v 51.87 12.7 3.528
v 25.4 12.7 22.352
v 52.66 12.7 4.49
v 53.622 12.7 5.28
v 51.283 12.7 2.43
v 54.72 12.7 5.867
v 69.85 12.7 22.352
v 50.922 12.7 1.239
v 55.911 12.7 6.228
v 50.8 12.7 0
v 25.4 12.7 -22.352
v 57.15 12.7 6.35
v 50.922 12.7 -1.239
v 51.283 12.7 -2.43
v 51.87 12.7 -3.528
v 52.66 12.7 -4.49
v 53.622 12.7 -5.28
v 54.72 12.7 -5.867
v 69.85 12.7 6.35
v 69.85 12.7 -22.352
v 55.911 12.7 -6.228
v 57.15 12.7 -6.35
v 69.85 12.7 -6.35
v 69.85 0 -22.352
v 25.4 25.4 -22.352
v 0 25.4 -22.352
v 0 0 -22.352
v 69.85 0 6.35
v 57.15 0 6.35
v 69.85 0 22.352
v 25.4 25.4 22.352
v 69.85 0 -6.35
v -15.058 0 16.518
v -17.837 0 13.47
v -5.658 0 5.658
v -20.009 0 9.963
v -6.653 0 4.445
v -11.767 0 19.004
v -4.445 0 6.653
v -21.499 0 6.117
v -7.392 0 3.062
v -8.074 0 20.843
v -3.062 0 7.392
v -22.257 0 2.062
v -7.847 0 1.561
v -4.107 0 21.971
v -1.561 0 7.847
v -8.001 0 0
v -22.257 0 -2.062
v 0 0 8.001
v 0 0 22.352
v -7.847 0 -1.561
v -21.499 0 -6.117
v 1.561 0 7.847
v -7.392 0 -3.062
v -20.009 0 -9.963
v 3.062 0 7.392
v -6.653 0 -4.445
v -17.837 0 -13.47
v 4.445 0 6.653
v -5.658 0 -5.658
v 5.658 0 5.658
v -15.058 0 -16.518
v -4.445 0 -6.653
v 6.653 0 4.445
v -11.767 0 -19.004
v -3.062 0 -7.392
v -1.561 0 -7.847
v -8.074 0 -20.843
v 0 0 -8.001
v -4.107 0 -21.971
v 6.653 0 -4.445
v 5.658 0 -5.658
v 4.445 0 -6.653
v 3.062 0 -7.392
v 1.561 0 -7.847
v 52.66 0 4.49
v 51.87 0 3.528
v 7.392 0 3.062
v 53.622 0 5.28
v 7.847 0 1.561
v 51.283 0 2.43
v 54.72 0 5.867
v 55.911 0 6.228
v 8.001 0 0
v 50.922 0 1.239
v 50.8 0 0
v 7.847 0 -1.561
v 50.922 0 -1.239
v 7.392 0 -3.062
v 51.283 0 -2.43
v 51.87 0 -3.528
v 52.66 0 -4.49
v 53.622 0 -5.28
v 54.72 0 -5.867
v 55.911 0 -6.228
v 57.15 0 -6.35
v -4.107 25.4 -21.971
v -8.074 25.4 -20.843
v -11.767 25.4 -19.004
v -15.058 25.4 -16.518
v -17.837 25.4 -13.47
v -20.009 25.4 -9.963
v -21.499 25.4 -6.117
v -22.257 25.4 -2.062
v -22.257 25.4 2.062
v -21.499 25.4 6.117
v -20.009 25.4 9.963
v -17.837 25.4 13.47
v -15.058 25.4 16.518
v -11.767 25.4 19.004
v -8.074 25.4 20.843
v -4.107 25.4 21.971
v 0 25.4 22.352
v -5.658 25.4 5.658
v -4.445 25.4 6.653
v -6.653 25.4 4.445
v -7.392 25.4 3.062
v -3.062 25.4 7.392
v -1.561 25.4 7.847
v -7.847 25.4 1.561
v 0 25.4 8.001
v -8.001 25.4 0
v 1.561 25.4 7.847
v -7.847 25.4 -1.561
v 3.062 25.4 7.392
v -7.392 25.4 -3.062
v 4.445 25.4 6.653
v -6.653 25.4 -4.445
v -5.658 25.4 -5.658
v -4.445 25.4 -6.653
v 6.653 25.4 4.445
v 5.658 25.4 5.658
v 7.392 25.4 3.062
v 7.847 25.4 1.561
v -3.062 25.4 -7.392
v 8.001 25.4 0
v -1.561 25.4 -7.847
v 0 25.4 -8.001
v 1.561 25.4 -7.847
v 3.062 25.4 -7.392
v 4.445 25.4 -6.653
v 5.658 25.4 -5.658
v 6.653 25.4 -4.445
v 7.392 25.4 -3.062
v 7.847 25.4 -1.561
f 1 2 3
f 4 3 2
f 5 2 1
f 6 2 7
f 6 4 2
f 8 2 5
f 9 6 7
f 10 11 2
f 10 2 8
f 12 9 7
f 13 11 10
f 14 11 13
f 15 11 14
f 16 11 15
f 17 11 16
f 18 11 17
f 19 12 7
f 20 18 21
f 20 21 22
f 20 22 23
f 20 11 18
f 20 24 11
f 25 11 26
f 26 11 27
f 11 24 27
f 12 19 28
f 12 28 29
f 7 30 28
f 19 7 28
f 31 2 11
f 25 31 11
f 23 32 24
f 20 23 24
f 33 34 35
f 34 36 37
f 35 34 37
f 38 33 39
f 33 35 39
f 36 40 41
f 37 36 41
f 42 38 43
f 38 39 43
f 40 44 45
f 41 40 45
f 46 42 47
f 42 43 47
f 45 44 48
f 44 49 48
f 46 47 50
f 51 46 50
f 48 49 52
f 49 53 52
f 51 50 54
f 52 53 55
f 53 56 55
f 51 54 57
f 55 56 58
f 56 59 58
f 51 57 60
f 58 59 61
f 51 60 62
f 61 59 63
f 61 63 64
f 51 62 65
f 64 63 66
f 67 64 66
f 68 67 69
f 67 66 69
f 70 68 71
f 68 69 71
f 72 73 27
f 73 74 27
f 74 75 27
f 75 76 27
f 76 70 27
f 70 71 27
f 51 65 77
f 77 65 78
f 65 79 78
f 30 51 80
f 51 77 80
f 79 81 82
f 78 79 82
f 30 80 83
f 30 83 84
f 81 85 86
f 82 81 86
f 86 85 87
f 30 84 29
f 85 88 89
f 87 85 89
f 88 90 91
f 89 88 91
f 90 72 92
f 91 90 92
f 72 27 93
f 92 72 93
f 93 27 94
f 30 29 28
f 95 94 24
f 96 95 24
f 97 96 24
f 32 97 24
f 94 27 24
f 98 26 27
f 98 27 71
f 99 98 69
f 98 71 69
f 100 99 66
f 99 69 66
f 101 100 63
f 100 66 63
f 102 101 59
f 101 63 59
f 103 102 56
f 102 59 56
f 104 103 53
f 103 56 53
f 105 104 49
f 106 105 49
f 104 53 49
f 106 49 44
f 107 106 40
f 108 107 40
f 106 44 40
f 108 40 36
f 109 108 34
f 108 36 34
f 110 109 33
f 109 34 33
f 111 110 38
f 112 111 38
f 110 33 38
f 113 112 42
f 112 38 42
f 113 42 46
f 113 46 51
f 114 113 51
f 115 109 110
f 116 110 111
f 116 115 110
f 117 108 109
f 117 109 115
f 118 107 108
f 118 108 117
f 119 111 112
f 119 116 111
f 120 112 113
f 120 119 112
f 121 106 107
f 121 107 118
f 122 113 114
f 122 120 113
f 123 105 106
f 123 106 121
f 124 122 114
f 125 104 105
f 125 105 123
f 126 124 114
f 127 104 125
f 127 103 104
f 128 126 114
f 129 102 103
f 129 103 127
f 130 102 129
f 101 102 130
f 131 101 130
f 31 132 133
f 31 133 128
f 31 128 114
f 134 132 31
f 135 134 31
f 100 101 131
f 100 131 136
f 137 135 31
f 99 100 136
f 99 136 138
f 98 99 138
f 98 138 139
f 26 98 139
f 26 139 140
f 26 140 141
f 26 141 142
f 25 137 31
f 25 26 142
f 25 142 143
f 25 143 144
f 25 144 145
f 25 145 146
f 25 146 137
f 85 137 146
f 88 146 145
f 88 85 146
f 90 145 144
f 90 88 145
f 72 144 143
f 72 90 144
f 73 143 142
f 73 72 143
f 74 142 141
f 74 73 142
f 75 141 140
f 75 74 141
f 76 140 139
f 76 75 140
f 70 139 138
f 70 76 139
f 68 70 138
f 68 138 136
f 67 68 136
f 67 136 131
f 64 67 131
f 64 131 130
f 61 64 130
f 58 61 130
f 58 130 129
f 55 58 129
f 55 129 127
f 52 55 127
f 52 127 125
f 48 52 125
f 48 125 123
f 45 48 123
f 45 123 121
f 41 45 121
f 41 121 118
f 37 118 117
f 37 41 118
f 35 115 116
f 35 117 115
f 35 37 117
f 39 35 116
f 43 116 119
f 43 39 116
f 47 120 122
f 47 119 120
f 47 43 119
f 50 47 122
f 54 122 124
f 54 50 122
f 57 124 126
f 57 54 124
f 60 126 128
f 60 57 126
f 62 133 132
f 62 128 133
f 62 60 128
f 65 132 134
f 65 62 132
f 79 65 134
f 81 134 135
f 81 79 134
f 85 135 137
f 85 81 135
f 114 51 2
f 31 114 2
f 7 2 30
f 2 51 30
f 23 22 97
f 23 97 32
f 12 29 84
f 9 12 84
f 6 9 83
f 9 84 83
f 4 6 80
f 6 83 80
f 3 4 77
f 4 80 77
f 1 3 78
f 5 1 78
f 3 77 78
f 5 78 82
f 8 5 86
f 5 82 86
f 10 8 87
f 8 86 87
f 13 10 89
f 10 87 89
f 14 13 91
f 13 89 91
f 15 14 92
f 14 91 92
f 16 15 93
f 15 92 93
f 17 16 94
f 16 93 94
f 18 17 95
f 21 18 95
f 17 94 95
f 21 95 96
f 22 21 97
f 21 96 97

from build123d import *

# Parameters (mm, degrees)
CROQUIS1_R              = 8.001
SALIENTE_EXTRUIR1_DEPTH = 31.75
SALIENTE_EXTRUIR2_DEPTH = 12.7
CROQUIS3_W              = 47.752
CROQUIS3_H              = 44.704
CORTAR_EXTRUIR4_DEPTH   = 6.35


with BuildPart() as part:
    # Croquis1 → Saliente-Extruir1 (new body)
    with BuildSketch(Plane(origin=(0, 0, 0), x_dir=(1, 0, 0), z_dir=(0, 1, 0))):
        with BuildLine():
            Line((0, -22.352), (25.4, -22.352))
            Line((25.4, -22.352), (25.4, 22.352))
            Line((25.4, 22.352), (0, 22.352))
            ThreePointArc((0, 22.352), (-22.352, 0), (0, -22.352))
        make_face()
        Circle(CROQUIS1_R, mode=Mode.SUBTRACT)
    extrude(amount=SALIENTE_EXTRUIR1_DEPTH)

    # Croquis1<3> → Saliente-Extruir2 (add)
    with BuildSketch(Plane(origin=(0, 0, 0), x_dir=(1, 0, 0), z_dir=(0, 1, 0))):
        with BuildLine():
            Line((69.85, -22.352), (69.85, -6.35))
            Line((69.85, -6.35), (57.15, -6.35))
            ThreePointArc((57.15, -6.35), (50.8, 0), (57.15, 6.35))
            Line((57.15, 6.35), (69.85, 6.35))
            Line((69.85, 6.35), (69.85, 22.352))
            Line((69.85, 22.352), (25.4, 22.352))
            Line((25.4, 22.352), (25.4, -22.352))
            Line((25.4, -22.352), (69.85, -22.352))
        make_face()
    extrude(amount=SALIENTE_EXTRUIR2_DEPTH)

    # Croquis3 → Cortar-Extruir4 (cut)
    with BuildSketch(Plane(origin=(0, 31.75, 0), x_dir=(1, 0, 0), z_dir=(0, 1, 0))):
        with Locations((1.524, 0)):
            Rectangle(CROQUIS3_W, CROQUIS3_H)
    extrude(amount=-CORTAR_EXTRUIR4_DEPTH, mode=Mode.SUBTRACT)


solid = part.part
